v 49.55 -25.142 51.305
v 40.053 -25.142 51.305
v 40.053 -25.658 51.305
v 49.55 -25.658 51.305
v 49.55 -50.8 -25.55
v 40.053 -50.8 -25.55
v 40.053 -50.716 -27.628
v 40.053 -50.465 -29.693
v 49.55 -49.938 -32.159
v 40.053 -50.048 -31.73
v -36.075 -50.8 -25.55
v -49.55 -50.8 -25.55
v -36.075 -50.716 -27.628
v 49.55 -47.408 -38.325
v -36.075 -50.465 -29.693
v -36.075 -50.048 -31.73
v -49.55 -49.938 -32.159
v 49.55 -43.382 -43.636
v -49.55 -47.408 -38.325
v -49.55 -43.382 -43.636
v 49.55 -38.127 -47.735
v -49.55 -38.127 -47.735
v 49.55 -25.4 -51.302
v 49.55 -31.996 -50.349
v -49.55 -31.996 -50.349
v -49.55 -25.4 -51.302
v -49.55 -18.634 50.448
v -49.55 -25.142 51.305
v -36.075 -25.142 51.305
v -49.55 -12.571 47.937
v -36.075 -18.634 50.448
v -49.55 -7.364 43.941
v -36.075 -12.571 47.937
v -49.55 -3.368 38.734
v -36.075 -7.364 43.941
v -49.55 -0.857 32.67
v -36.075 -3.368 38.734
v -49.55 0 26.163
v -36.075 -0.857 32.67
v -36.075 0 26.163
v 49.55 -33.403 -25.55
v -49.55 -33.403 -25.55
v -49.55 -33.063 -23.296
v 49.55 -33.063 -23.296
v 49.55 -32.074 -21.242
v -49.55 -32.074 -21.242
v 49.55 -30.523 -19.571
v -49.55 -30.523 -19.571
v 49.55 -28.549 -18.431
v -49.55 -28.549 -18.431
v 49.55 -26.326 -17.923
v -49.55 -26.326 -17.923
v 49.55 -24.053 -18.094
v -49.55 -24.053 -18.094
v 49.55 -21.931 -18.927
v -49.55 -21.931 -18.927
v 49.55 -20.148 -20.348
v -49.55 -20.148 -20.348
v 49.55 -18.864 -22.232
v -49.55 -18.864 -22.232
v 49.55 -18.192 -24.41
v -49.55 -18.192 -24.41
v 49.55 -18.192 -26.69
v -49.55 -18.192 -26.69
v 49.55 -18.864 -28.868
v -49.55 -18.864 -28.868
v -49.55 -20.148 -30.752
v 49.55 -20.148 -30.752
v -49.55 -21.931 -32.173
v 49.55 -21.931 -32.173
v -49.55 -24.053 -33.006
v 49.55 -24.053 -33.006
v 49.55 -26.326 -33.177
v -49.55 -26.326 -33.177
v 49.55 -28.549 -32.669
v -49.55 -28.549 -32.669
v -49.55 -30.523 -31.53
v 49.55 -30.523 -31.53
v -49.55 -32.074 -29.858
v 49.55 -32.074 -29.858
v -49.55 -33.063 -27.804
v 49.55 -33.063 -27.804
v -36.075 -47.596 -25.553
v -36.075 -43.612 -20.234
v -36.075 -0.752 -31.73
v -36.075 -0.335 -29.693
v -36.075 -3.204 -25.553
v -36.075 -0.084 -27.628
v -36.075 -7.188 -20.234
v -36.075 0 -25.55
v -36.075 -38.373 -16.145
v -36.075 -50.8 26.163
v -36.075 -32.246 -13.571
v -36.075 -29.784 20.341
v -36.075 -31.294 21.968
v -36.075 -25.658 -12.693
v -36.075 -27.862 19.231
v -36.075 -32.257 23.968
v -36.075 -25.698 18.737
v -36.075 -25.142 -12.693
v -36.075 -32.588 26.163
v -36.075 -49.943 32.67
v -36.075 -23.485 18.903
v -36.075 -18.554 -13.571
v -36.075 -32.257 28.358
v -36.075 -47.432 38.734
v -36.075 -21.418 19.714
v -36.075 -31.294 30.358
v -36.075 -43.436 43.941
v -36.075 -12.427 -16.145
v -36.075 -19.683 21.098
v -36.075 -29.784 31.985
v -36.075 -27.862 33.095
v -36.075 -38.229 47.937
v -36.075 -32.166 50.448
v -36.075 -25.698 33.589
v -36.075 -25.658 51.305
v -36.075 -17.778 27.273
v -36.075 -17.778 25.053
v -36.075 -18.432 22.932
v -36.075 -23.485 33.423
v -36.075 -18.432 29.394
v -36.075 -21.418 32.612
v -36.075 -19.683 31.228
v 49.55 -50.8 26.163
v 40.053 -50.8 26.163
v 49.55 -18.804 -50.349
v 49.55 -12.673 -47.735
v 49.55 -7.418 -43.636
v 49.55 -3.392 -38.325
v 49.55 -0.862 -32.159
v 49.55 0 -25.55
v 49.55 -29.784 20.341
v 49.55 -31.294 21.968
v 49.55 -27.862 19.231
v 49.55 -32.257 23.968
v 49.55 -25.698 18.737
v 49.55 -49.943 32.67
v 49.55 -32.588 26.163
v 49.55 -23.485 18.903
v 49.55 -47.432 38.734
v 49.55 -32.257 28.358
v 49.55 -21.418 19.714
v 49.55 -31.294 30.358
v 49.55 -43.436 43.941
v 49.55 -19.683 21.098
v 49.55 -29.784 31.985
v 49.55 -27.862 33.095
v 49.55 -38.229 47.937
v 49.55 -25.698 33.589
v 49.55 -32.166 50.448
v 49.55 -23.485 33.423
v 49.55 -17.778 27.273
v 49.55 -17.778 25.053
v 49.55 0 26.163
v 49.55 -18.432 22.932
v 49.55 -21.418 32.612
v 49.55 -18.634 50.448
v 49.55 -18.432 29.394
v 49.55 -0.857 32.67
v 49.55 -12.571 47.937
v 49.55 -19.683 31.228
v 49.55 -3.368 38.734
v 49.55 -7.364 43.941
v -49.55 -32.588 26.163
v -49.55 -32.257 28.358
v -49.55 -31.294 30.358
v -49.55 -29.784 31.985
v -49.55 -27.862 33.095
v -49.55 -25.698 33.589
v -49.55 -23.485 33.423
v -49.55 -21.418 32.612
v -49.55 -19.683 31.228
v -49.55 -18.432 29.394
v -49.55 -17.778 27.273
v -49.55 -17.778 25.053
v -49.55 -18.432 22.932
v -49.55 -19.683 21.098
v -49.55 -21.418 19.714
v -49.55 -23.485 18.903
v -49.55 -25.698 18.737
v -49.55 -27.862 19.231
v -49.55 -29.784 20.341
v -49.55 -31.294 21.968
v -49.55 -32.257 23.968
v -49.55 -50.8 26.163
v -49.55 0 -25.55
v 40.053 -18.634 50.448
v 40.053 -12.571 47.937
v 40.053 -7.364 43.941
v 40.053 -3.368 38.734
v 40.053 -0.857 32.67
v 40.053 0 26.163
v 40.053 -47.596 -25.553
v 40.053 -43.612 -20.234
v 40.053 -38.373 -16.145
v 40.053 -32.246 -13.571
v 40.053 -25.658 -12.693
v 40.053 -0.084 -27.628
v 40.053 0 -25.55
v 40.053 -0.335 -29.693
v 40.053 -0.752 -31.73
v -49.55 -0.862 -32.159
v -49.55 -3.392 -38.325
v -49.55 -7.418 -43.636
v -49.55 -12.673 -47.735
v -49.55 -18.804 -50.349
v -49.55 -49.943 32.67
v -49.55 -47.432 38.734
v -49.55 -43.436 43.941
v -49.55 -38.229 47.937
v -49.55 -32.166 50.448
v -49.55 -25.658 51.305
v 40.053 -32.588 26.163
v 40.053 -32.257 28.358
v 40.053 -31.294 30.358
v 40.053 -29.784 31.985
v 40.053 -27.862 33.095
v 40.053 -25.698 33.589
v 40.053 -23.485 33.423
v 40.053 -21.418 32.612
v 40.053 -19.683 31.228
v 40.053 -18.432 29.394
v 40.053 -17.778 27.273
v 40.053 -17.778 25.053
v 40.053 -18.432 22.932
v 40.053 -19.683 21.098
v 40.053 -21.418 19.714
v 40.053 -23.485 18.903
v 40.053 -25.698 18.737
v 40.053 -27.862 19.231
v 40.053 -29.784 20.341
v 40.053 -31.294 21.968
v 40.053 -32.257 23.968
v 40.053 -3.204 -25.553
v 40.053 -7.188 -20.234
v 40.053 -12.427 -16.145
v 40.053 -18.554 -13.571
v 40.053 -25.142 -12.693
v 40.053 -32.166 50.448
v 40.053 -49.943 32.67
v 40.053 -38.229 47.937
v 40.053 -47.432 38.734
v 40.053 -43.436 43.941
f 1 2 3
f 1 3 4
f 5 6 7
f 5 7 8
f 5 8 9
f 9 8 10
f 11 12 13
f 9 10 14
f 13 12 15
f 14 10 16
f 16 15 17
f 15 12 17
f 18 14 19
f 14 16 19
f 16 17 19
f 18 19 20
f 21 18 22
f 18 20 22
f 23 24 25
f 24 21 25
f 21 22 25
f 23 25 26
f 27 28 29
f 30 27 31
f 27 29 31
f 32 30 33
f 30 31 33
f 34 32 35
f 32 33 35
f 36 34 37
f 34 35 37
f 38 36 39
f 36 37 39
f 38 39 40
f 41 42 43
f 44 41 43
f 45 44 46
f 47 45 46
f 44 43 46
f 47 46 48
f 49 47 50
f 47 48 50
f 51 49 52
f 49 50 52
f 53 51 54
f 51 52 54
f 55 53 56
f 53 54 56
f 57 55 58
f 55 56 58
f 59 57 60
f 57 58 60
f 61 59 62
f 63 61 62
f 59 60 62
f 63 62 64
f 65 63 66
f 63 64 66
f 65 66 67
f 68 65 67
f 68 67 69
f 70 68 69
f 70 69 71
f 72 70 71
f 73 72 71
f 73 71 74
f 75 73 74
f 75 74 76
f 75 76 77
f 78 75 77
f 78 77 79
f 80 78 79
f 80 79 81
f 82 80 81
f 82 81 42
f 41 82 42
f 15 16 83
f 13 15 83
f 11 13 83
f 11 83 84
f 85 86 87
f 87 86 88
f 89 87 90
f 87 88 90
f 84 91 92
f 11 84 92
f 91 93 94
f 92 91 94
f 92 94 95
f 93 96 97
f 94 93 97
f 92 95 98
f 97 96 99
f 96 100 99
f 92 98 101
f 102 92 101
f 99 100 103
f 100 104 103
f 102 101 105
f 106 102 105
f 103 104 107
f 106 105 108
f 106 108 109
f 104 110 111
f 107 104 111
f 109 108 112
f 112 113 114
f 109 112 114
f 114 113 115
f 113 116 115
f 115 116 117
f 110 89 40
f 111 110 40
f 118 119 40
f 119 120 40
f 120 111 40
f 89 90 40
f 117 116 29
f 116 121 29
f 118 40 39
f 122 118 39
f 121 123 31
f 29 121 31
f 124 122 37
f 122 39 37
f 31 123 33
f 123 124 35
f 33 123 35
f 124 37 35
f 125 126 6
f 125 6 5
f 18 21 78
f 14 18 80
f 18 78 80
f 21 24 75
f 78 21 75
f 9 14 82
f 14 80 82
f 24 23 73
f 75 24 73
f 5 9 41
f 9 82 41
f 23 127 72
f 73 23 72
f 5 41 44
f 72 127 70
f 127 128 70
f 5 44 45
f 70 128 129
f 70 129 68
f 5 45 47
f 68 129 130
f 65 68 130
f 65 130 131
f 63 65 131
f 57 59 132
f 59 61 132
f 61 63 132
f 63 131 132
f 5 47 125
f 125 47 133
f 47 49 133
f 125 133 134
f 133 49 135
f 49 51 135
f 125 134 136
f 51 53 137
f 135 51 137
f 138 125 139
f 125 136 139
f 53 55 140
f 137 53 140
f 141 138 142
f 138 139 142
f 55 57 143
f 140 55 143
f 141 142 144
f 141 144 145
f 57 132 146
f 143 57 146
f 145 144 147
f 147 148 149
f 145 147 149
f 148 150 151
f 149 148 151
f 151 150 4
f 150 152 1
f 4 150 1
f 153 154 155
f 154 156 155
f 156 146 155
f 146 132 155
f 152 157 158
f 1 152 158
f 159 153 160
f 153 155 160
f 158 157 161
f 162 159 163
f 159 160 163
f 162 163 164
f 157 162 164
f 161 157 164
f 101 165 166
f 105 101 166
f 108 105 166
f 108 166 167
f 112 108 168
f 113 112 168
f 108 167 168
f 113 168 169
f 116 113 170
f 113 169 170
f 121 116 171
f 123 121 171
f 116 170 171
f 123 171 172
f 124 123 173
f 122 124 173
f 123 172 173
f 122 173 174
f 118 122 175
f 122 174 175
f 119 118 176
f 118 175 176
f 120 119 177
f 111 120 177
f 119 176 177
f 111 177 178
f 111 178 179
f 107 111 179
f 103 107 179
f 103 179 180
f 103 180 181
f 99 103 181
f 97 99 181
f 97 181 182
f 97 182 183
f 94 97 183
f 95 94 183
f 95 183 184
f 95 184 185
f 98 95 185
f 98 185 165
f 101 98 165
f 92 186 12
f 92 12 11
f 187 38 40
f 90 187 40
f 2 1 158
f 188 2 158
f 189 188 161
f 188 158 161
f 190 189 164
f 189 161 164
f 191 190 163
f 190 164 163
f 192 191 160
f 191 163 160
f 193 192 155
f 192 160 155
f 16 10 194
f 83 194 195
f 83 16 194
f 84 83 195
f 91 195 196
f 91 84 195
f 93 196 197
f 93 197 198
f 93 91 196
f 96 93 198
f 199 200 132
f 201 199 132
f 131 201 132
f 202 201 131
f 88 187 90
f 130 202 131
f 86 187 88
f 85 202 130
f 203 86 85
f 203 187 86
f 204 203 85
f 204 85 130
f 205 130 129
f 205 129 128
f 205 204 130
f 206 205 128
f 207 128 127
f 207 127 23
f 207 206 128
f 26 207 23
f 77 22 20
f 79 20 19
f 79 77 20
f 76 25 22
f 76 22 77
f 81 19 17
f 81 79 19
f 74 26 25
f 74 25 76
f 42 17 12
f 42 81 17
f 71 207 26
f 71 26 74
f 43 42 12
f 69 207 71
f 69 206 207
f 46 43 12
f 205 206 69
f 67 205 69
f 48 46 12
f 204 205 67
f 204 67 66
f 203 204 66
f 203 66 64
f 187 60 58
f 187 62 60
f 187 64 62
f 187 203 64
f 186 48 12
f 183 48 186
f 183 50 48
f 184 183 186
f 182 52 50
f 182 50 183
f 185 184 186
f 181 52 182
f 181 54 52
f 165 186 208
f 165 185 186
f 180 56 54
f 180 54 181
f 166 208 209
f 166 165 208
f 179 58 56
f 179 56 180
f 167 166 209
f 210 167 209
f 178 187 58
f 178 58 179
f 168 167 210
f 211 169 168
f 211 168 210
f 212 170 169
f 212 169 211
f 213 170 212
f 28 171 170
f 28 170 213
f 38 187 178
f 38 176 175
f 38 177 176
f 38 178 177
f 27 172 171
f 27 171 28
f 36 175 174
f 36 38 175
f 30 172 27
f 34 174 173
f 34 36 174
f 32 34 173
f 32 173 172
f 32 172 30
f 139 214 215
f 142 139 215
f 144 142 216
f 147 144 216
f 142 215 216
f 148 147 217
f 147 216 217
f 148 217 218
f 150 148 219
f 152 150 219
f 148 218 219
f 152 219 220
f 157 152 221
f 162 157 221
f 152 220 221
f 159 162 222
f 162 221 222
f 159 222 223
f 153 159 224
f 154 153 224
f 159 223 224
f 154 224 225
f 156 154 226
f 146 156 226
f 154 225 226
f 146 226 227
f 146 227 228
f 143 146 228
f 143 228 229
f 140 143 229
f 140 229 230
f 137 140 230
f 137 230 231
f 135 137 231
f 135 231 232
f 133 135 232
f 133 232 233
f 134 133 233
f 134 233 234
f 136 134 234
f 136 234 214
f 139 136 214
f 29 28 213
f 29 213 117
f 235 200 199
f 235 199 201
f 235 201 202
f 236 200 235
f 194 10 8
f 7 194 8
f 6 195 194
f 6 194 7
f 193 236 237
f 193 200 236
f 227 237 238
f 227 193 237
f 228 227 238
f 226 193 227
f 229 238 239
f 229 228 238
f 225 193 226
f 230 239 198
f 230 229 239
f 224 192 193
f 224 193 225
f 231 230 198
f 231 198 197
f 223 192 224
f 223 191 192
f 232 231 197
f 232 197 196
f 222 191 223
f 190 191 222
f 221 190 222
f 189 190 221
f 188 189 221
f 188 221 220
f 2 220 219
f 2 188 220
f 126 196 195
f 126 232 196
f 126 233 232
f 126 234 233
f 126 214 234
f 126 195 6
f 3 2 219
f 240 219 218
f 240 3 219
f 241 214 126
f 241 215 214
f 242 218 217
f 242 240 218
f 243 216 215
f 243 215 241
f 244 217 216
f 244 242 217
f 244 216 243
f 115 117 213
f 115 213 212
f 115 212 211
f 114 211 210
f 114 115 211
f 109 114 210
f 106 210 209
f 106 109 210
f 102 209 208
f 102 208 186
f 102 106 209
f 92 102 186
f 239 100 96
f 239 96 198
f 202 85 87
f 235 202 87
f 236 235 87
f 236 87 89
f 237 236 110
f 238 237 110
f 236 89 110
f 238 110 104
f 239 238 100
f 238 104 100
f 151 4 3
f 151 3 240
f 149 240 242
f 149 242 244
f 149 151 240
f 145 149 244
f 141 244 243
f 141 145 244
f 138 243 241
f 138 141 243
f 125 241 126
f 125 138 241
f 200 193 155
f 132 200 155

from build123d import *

# Parameters (mm, degrees)
F0_W        = 99.0999639034
F0_H        = 102.6097461581
F1_DEPTH    = 50.8
F2_R        = 25.1416200386
F3_T1_DEPTH = 227.8741153204
F4_R        = 7.4465956944
F4_R_2      = 7.6481080303
F5_DEPTH    = 155.448
F6_W        = 76.1274546385
F6_H        = 70.1917465776
F7_DEPTH    = 112.268
F8_T1_DEPTH = 76.1274546385


# Not quite as in the source:
# - a fillet or chamfer that OpenCascade refuses, or shapes differently, is made with other operations: its cross-section is extruded or revolved along the edge and cut away or added


with BuildPart() as f1:
    # F0 (on Front) → F1 (new body)
    with BuildSketch(Plane.XZ):
        Rectangle(F0_W, F0_H)
    extrude(amount=F1_DEPTH)

    # F2
    f2_edges = [f1.edges().sort_by_distance(p)[0] for p in [
        (0, -50.8, 51.304873),
        (0, 0, 51.304873),
    ]]
    fillet(f2_edges, radius=F2_R)

    # F3: fillet of radius 25.7548302834 on 2 edges, made by hand

    # F3_s2 → F3_t1 (cut)
    with BuildSketch(Plane.YZ.offset(-113.9370576602)):
        with BuildLine():
            ThreePointArc((0, -25.5500427957), (-7.5434151417, -43.7614579374), (-25.7548302834, -51.3048730791))
            Line((-25.7548302834, -51.3048730791), (0, -51.3048730791))
            Line((0, -51.3048730791), (0, -25.5500427957))
        make_face()
        with BuildLine():
            ThreePointArc((-50.8, -25.5500427957), (-43.2565848583, -43.7614579374), (-25.0451697166, -51.3048730791))
            Line((-25.0451697166, -51.3048730791), (-50.8, -51.3048730791))
            Line((-50.8, -51.3048730791), (-50.8, -25.5500427957))
        make_face()
    extrude(amount=F3_T1_DEPTH, mode=Mode.SUBTRACT)

    # F4 (on face) → F5 (cut)
    with BuildSketch(Plane(origin=(-49.5499819517, 0, 0), x_dir=(0, -1, 0), z_dir=(-1, 0, 0))):
        with Locations((25.1416200386, 26.1632530405)):
            Circle(F4_R)
        with Locations((25.7548302834, -25.5500427957)):
            Circle(F4_R_2)
    extrude(amount=-F5_DEPTH, mode=Mode.SUBTRACT)

    # F6 (on Front) → F7 (cut)
    with BuildSketch(Plane.XZ):
        with Locations((1.9891783595, 22.4027493969)):
            Rectangle(F6_W, F6_H)
    extrude(amount=F7_DEPTH, mode=Mode.SUBTRACT)

    # F8: fillet of radius 25.1416200386 on 2 edges, made by hand

    # F8_s2 → F8_t1 (cut)
    with BuildSketch(Plane.YZ.offset(-36.0745489597)):
        with BuildLine():
            ThreePointArc((-50.8, -37.8347439305), (-43.4361899807, -20.0569339112), (-25.6583799614, -12.6931238919))
            Line((-25.6583799614, -12.6931238919), (-50.8, -12.6931238919))
            Line((-50.8, -12.6931238919), (-50.8, -37.8347439305))
        make_face()
        with BuildLine():
            ThreePointArc((0, -37.8347439305), (-7.3638100193, -20.0569339112), (-25.1416200386, -12.6931238919))
            Line((-25.1416200386, -12.6931238919), (0, -12.6931238919))
            Line((0, -12.6931238919), (0, -37.8347439305))
        make_face()
    extrude(amount=F8_T1_DEPTH, mode=Mode.SUBTRACT)


solid = f1.part
